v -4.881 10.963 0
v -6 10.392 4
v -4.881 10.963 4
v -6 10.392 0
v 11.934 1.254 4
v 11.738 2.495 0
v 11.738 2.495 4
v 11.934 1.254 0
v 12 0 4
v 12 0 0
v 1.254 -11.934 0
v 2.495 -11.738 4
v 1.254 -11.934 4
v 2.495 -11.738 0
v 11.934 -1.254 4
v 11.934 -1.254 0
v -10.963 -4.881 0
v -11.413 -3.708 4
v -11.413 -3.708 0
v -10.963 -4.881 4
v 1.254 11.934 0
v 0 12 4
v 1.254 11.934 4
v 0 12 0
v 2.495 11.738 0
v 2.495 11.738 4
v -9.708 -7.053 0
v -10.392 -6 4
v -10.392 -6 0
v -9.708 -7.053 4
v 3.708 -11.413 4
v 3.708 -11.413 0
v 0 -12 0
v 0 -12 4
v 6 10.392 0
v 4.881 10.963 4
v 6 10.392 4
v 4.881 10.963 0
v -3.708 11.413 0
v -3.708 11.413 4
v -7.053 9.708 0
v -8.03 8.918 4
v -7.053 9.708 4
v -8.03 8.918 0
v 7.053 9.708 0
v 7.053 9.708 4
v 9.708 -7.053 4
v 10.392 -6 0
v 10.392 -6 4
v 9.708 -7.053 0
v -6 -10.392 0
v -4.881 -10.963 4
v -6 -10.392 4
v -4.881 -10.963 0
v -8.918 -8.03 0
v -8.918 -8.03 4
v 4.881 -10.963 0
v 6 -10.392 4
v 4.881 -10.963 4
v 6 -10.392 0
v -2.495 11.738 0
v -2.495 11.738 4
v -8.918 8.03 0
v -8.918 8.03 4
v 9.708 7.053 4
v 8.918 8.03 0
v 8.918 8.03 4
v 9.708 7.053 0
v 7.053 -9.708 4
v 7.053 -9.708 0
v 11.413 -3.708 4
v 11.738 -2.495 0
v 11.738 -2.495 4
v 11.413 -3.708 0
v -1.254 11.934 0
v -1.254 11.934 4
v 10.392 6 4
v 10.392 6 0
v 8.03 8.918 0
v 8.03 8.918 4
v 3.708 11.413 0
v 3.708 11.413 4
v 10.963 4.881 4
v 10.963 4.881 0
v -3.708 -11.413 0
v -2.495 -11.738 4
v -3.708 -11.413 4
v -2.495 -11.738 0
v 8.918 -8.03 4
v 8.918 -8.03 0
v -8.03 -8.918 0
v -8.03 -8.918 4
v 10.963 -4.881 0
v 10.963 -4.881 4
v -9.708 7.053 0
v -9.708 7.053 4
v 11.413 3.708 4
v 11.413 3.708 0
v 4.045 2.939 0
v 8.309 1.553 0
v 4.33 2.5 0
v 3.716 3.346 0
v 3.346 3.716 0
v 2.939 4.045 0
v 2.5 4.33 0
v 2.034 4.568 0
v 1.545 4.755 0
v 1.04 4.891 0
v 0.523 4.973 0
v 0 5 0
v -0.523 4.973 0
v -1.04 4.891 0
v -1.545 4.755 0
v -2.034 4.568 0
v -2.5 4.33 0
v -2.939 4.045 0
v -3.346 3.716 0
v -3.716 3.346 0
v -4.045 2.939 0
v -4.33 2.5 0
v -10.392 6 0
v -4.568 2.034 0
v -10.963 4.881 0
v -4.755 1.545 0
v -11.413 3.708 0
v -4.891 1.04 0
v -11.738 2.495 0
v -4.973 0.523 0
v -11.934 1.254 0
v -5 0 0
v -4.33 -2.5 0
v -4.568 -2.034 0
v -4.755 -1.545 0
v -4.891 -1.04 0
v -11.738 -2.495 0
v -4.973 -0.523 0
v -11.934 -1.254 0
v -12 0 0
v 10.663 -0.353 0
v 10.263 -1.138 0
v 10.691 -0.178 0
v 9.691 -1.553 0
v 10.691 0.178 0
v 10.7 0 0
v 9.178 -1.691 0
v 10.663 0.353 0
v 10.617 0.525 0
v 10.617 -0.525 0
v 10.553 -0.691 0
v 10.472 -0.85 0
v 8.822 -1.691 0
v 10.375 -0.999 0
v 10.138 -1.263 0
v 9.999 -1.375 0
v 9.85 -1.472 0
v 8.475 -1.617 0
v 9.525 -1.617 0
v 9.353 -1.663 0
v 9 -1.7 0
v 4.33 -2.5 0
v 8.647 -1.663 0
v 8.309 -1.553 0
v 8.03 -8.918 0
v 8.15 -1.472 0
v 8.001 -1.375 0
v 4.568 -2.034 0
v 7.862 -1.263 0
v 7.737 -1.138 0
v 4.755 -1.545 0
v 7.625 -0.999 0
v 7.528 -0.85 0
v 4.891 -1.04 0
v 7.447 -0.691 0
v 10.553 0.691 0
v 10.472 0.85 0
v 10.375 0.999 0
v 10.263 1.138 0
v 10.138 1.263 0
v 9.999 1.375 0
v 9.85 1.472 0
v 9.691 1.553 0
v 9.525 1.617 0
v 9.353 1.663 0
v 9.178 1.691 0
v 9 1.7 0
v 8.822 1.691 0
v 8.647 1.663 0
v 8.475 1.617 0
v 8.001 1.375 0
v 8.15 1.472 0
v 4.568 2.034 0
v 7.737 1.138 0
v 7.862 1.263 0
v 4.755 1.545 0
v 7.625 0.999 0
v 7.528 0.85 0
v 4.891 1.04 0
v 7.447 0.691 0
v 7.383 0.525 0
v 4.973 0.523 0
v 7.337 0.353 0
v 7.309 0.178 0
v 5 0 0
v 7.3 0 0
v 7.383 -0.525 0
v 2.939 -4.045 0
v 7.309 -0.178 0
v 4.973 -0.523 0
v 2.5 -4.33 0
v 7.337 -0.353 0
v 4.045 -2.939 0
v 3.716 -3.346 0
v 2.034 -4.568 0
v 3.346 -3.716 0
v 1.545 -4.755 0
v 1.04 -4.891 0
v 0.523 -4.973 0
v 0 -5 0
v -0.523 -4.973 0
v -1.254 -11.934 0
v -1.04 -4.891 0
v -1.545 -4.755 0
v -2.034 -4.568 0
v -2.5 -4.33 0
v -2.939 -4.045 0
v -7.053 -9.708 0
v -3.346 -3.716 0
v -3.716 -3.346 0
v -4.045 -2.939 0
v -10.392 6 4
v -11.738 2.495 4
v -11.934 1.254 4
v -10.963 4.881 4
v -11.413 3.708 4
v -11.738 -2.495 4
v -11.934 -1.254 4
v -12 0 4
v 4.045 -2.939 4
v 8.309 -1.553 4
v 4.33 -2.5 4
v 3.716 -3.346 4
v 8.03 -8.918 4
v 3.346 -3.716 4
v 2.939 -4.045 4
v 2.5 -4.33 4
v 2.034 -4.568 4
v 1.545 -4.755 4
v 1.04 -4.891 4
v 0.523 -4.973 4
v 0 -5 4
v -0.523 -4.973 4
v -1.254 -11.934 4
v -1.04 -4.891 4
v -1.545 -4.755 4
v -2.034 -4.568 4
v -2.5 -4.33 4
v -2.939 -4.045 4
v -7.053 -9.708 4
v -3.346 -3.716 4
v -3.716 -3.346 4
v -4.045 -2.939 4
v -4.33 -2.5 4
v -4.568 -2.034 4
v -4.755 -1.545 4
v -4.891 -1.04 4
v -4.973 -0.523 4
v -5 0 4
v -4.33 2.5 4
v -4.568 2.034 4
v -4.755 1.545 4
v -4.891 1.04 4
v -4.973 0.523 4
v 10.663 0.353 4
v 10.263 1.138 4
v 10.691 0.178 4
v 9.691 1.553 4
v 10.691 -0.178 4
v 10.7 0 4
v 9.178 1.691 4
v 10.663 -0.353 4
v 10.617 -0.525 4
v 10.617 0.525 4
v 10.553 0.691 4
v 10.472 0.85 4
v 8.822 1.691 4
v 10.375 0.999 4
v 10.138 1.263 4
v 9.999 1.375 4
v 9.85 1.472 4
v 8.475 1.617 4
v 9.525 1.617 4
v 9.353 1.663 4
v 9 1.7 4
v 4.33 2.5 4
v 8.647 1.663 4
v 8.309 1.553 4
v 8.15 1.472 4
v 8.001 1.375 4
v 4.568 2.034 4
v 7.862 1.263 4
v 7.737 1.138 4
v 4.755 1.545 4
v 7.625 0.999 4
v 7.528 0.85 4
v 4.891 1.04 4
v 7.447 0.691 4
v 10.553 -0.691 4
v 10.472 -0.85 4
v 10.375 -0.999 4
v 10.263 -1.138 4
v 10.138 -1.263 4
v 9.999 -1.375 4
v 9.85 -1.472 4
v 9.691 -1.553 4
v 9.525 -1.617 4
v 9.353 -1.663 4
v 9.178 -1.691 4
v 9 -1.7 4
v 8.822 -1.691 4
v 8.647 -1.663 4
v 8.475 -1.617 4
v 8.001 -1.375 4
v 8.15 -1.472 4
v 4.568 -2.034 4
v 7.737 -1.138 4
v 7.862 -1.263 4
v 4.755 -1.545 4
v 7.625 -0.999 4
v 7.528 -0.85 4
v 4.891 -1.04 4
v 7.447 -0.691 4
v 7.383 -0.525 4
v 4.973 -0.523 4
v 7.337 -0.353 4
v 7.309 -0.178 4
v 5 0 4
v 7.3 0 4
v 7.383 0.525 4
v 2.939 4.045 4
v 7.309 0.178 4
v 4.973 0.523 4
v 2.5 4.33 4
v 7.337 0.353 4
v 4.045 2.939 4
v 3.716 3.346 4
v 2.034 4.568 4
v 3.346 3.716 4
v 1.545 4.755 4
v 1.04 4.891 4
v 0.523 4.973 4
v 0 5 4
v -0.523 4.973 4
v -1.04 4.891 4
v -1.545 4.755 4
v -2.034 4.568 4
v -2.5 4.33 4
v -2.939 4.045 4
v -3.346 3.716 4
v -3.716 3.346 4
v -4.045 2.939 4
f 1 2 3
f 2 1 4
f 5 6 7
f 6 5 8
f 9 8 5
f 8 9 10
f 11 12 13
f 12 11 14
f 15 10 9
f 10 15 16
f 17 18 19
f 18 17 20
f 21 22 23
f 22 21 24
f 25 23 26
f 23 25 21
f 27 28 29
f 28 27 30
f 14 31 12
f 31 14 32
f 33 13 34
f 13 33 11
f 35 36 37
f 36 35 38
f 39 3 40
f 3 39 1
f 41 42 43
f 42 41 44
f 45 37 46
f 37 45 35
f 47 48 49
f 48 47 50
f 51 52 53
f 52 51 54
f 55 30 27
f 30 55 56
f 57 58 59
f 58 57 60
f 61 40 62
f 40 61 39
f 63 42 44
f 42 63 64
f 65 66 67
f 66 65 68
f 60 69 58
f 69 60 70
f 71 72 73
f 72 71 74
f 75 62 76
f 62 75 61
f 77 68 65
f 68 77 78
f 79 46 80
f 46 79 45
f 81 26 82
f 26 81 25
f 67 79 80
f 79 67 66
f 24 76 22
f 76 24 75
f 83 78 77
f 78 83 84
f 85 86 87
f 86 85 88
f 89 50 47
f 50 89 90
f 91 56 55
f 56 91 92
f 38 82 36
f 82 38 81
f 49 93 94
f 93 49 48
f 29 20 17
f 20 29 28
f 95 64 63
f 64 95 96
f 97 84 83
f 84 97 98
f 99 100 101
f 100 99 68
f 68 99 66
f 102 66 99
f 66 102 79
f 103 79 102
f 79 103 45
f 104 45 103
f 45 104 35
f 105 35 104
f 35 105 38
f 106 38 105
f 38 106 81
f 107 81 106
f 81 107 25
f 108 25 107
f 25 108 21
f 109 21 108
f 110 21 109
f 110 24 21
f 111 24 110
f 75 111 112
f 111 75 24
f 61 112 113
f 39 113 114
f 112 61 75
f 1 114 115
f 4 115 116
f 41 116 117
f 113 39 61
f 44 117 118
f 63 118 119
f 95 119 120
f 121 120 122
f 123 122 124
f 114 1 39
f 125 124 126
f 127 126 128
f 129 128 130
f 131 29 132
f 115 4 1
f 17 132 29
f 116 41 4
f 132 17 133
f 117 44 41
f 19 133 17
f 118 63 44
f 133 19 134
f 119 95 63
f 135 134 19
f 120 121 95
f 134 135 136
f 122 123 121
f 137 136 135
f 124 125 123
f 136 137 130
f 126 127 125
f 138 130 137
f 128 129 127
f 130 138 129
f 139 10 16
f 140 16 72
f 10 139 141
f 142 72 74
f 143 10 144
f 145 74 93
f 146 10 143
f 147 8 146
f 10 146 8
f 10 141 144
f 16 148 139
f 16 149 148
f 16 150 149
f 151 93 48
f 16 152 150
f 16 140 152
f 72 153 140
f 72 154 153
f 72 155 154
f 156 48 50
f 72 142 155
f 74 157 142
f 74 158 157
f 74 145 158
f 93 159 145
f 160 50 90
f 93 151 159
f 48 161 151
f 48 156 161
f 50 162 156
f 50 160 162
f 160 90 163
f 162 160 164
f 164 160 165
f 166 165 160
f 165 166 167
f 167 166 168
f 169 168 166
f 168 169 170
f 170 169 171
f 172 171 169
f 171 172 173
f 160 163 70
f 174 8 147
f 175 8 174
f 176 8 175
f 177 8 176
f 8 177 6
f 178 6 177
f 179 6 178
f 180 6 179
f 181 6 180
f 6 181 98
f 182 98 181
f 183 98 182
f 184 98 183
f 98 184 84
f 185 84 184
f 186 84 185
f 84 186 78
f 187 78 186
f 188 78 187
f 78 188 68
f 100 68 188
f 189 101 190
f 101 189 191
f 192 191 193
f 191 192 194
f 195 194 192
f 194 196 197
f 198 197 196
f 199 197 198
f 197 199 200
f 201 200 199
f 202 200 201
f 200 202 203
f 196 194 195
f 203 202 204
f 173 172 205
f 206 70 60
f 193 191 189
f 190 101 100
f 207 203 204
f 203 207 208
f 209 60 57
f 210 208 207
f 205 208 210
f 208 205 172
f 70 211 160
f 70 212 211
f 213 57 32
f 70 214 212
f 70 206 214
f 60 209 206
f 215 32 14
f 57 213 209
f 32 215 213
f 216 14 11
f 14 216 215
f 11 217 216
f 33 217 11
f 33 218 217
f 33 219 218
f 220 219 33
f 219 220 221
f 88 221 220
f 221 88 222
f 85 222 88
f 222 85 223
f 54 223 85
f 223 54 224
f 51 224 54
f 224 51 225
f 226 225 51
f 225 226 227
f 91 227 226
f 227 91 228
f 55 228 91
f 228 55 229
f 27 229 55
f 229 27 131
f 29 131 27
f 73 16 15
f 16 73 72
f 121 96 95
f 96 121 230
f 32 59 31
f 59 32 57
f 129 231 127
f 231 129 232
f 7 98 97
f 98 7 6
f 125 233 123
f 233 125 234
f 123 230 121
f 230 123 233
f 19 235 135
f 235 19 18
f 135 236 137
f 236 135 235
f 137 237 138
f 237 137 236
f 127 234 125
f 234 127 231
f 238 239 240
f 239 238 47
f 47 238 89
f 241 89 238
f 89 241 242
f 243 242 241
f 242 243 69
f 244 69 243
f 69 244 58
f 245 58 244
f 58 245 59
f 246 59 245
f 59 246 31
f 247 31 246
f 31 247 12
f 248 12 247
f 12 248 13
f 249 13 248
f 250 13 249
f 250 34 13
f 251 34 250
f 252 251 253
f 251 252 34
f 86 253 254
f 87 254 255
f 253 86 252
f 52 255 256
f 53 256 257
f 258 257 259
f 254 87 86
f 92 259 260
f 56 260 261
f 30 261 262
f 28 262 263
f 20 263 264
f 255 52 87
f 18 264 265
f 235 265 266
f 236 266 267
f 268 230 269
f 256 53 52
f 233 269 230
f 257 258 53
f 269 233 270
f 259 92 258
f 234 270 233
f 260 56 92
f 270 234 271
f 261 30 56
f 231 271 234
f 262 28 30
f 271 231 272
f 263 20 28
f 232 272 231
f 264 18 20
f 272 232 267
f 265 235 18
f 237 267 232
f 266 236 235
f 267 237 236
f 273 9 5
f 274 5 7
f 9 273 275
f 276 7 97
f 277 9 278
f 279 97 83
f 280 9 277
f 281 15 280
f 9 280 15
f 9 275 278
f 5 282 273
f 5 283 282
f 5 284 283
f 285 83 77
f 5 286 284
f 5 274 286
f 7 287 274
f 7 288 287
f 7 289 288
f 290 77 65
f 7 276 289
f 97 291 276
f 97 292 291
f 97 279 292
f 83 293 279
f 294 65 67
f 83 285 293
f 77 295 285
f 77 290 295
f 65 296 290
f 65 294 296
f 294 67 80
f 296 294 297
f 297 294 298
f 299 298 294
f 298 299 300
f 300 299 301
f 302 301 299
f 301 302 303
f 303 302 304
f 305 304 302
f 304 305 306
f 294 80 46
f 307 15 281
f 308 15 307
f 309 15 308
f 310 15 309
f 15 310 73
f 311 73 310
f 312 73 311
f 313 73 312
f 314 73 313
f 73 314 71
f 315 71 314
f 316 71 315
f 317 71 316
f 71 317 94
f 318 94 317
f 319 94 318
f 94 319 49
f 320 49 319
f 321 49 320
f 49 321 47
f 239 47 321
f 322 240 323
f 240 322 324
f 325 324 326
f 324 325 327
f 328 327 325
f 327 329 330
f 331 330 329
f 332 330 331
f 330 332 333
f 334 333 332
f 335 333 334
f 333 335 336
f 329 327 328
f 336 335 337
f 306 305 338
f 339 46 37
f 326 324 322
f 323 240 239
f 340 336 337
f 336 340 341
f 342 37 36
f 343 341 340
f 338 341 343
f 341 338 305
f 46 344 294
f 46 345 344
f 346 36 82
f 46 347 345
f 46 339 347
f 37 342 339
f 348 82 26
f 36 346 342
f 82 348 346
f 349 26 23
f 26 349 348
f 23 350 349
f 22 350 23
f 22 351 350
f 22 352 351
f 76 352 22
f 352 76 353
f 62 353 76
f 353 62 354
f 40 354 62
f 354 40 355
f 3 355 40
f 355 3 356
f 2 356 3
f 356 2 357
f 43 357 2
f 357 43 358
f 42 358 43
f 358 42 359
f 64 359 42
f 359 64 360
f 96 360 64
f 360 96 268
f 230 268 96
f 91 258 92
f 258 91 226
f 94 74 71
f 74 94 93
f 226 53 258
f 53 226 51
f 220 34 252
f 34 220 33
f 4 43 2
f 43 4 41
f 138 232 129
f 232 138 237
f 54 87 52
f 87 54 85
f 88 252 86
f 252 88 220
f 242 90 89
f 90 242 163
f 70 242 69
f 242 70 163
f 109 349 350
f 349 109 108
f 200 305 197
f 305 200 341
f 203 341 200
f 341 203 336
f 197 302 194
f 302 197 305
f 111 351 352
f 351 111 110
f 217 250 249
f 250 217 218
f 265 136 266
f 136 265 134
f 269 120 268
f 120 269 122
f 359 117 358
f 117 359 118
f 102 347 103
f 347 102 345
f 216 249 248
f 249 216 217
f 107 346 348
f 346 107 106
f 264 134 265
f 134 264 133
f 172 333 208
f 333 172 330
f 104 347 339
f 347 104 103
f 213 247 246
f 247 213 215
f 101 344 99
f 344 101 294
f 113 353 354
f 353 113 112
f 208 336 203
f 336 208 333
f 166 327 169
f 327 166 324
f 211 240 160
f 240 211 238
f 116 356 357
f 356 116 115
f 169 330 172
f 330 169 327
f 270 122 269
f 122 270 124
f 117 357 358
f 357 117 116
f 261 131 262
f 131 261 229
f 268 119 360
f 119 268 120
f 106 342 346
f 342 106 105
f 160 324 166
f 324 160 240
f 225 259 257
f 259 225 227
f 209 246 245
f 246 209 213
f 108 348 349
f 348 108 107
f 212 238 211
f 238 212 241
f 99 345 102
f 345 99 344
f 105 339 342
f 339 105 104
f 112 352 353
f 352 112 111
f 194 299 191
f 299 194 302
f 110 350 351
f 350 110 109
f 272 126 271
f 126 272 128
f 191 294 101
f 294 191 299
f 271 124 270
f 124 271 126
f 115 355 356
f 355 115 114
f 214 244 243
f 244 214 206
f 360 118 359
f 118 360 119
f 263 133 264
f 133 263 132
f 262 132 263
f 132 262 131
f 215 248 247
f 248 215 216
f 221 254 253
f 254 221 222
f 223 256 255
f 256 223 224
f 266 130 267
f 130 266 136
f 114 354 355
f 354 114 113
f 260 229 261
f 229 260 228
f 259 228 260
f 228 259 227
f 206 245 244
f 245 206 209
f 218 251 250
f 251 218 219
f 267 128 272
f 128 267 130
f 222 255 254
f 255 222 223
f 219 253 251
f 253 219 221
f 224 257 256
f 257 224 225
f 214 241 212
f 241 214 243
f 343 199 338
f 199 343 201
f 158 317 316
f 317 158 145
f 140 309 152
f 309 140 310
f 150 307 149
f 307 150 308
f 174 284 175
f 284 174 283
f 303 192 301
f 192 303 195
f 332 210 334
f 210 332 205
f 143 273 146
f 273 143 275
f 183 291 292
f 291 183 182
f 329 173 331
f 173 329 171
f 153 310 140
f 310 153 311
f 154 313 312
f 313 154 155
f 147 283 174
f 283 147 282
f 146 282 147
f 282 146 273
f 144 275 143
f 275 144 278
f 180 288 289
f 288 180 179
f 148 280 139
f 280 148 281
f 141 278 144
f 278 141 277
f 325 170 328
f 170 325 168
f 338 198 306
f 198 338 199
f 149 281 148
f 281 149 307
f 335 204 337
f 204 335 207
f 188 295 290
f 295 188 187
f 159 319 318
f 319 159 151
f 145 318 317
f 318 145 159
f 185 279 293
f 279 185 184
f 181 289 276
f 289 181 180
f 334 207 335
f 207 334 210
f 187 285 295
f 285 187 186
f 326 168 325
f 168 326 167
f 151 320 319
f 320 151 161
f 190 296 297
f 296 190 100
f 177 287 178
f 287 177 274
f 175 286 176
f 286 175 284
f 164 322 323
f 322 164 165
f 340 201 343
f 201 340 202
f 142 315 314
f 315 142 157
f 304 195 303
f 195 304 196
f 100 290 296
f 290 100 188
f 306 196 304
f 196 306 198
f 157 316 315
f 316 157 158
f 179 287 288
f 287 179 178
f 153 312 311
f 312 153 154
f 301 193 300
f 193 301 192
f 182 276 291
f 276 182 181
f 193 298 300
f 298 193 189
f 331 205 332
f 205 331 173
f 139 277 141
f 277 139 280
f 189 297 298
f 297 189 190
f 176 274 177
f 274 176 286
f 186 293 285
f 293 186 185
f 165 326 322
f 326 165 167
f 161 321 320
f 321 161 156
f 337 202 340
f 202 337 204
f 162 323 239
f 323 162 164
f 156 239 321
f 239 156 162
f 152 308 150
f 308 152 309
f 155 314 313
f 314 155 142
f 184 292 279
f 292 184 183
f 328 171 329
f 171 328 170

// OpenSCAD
// Closed cable guide ring.
$fn = 60;
eps = 0.02;
cable_d = 10;
outer_d = 24;
thickness = 4;
difference() { cylinder(d=outer_d,h=thickness); translate([0,0,-eps]) cylinder(d=cable_d,h=thickness+2*eps); translate([outer_d/2-3,0,-eps]) cylinder(d=3.4,h=thickness+2*eps); }
